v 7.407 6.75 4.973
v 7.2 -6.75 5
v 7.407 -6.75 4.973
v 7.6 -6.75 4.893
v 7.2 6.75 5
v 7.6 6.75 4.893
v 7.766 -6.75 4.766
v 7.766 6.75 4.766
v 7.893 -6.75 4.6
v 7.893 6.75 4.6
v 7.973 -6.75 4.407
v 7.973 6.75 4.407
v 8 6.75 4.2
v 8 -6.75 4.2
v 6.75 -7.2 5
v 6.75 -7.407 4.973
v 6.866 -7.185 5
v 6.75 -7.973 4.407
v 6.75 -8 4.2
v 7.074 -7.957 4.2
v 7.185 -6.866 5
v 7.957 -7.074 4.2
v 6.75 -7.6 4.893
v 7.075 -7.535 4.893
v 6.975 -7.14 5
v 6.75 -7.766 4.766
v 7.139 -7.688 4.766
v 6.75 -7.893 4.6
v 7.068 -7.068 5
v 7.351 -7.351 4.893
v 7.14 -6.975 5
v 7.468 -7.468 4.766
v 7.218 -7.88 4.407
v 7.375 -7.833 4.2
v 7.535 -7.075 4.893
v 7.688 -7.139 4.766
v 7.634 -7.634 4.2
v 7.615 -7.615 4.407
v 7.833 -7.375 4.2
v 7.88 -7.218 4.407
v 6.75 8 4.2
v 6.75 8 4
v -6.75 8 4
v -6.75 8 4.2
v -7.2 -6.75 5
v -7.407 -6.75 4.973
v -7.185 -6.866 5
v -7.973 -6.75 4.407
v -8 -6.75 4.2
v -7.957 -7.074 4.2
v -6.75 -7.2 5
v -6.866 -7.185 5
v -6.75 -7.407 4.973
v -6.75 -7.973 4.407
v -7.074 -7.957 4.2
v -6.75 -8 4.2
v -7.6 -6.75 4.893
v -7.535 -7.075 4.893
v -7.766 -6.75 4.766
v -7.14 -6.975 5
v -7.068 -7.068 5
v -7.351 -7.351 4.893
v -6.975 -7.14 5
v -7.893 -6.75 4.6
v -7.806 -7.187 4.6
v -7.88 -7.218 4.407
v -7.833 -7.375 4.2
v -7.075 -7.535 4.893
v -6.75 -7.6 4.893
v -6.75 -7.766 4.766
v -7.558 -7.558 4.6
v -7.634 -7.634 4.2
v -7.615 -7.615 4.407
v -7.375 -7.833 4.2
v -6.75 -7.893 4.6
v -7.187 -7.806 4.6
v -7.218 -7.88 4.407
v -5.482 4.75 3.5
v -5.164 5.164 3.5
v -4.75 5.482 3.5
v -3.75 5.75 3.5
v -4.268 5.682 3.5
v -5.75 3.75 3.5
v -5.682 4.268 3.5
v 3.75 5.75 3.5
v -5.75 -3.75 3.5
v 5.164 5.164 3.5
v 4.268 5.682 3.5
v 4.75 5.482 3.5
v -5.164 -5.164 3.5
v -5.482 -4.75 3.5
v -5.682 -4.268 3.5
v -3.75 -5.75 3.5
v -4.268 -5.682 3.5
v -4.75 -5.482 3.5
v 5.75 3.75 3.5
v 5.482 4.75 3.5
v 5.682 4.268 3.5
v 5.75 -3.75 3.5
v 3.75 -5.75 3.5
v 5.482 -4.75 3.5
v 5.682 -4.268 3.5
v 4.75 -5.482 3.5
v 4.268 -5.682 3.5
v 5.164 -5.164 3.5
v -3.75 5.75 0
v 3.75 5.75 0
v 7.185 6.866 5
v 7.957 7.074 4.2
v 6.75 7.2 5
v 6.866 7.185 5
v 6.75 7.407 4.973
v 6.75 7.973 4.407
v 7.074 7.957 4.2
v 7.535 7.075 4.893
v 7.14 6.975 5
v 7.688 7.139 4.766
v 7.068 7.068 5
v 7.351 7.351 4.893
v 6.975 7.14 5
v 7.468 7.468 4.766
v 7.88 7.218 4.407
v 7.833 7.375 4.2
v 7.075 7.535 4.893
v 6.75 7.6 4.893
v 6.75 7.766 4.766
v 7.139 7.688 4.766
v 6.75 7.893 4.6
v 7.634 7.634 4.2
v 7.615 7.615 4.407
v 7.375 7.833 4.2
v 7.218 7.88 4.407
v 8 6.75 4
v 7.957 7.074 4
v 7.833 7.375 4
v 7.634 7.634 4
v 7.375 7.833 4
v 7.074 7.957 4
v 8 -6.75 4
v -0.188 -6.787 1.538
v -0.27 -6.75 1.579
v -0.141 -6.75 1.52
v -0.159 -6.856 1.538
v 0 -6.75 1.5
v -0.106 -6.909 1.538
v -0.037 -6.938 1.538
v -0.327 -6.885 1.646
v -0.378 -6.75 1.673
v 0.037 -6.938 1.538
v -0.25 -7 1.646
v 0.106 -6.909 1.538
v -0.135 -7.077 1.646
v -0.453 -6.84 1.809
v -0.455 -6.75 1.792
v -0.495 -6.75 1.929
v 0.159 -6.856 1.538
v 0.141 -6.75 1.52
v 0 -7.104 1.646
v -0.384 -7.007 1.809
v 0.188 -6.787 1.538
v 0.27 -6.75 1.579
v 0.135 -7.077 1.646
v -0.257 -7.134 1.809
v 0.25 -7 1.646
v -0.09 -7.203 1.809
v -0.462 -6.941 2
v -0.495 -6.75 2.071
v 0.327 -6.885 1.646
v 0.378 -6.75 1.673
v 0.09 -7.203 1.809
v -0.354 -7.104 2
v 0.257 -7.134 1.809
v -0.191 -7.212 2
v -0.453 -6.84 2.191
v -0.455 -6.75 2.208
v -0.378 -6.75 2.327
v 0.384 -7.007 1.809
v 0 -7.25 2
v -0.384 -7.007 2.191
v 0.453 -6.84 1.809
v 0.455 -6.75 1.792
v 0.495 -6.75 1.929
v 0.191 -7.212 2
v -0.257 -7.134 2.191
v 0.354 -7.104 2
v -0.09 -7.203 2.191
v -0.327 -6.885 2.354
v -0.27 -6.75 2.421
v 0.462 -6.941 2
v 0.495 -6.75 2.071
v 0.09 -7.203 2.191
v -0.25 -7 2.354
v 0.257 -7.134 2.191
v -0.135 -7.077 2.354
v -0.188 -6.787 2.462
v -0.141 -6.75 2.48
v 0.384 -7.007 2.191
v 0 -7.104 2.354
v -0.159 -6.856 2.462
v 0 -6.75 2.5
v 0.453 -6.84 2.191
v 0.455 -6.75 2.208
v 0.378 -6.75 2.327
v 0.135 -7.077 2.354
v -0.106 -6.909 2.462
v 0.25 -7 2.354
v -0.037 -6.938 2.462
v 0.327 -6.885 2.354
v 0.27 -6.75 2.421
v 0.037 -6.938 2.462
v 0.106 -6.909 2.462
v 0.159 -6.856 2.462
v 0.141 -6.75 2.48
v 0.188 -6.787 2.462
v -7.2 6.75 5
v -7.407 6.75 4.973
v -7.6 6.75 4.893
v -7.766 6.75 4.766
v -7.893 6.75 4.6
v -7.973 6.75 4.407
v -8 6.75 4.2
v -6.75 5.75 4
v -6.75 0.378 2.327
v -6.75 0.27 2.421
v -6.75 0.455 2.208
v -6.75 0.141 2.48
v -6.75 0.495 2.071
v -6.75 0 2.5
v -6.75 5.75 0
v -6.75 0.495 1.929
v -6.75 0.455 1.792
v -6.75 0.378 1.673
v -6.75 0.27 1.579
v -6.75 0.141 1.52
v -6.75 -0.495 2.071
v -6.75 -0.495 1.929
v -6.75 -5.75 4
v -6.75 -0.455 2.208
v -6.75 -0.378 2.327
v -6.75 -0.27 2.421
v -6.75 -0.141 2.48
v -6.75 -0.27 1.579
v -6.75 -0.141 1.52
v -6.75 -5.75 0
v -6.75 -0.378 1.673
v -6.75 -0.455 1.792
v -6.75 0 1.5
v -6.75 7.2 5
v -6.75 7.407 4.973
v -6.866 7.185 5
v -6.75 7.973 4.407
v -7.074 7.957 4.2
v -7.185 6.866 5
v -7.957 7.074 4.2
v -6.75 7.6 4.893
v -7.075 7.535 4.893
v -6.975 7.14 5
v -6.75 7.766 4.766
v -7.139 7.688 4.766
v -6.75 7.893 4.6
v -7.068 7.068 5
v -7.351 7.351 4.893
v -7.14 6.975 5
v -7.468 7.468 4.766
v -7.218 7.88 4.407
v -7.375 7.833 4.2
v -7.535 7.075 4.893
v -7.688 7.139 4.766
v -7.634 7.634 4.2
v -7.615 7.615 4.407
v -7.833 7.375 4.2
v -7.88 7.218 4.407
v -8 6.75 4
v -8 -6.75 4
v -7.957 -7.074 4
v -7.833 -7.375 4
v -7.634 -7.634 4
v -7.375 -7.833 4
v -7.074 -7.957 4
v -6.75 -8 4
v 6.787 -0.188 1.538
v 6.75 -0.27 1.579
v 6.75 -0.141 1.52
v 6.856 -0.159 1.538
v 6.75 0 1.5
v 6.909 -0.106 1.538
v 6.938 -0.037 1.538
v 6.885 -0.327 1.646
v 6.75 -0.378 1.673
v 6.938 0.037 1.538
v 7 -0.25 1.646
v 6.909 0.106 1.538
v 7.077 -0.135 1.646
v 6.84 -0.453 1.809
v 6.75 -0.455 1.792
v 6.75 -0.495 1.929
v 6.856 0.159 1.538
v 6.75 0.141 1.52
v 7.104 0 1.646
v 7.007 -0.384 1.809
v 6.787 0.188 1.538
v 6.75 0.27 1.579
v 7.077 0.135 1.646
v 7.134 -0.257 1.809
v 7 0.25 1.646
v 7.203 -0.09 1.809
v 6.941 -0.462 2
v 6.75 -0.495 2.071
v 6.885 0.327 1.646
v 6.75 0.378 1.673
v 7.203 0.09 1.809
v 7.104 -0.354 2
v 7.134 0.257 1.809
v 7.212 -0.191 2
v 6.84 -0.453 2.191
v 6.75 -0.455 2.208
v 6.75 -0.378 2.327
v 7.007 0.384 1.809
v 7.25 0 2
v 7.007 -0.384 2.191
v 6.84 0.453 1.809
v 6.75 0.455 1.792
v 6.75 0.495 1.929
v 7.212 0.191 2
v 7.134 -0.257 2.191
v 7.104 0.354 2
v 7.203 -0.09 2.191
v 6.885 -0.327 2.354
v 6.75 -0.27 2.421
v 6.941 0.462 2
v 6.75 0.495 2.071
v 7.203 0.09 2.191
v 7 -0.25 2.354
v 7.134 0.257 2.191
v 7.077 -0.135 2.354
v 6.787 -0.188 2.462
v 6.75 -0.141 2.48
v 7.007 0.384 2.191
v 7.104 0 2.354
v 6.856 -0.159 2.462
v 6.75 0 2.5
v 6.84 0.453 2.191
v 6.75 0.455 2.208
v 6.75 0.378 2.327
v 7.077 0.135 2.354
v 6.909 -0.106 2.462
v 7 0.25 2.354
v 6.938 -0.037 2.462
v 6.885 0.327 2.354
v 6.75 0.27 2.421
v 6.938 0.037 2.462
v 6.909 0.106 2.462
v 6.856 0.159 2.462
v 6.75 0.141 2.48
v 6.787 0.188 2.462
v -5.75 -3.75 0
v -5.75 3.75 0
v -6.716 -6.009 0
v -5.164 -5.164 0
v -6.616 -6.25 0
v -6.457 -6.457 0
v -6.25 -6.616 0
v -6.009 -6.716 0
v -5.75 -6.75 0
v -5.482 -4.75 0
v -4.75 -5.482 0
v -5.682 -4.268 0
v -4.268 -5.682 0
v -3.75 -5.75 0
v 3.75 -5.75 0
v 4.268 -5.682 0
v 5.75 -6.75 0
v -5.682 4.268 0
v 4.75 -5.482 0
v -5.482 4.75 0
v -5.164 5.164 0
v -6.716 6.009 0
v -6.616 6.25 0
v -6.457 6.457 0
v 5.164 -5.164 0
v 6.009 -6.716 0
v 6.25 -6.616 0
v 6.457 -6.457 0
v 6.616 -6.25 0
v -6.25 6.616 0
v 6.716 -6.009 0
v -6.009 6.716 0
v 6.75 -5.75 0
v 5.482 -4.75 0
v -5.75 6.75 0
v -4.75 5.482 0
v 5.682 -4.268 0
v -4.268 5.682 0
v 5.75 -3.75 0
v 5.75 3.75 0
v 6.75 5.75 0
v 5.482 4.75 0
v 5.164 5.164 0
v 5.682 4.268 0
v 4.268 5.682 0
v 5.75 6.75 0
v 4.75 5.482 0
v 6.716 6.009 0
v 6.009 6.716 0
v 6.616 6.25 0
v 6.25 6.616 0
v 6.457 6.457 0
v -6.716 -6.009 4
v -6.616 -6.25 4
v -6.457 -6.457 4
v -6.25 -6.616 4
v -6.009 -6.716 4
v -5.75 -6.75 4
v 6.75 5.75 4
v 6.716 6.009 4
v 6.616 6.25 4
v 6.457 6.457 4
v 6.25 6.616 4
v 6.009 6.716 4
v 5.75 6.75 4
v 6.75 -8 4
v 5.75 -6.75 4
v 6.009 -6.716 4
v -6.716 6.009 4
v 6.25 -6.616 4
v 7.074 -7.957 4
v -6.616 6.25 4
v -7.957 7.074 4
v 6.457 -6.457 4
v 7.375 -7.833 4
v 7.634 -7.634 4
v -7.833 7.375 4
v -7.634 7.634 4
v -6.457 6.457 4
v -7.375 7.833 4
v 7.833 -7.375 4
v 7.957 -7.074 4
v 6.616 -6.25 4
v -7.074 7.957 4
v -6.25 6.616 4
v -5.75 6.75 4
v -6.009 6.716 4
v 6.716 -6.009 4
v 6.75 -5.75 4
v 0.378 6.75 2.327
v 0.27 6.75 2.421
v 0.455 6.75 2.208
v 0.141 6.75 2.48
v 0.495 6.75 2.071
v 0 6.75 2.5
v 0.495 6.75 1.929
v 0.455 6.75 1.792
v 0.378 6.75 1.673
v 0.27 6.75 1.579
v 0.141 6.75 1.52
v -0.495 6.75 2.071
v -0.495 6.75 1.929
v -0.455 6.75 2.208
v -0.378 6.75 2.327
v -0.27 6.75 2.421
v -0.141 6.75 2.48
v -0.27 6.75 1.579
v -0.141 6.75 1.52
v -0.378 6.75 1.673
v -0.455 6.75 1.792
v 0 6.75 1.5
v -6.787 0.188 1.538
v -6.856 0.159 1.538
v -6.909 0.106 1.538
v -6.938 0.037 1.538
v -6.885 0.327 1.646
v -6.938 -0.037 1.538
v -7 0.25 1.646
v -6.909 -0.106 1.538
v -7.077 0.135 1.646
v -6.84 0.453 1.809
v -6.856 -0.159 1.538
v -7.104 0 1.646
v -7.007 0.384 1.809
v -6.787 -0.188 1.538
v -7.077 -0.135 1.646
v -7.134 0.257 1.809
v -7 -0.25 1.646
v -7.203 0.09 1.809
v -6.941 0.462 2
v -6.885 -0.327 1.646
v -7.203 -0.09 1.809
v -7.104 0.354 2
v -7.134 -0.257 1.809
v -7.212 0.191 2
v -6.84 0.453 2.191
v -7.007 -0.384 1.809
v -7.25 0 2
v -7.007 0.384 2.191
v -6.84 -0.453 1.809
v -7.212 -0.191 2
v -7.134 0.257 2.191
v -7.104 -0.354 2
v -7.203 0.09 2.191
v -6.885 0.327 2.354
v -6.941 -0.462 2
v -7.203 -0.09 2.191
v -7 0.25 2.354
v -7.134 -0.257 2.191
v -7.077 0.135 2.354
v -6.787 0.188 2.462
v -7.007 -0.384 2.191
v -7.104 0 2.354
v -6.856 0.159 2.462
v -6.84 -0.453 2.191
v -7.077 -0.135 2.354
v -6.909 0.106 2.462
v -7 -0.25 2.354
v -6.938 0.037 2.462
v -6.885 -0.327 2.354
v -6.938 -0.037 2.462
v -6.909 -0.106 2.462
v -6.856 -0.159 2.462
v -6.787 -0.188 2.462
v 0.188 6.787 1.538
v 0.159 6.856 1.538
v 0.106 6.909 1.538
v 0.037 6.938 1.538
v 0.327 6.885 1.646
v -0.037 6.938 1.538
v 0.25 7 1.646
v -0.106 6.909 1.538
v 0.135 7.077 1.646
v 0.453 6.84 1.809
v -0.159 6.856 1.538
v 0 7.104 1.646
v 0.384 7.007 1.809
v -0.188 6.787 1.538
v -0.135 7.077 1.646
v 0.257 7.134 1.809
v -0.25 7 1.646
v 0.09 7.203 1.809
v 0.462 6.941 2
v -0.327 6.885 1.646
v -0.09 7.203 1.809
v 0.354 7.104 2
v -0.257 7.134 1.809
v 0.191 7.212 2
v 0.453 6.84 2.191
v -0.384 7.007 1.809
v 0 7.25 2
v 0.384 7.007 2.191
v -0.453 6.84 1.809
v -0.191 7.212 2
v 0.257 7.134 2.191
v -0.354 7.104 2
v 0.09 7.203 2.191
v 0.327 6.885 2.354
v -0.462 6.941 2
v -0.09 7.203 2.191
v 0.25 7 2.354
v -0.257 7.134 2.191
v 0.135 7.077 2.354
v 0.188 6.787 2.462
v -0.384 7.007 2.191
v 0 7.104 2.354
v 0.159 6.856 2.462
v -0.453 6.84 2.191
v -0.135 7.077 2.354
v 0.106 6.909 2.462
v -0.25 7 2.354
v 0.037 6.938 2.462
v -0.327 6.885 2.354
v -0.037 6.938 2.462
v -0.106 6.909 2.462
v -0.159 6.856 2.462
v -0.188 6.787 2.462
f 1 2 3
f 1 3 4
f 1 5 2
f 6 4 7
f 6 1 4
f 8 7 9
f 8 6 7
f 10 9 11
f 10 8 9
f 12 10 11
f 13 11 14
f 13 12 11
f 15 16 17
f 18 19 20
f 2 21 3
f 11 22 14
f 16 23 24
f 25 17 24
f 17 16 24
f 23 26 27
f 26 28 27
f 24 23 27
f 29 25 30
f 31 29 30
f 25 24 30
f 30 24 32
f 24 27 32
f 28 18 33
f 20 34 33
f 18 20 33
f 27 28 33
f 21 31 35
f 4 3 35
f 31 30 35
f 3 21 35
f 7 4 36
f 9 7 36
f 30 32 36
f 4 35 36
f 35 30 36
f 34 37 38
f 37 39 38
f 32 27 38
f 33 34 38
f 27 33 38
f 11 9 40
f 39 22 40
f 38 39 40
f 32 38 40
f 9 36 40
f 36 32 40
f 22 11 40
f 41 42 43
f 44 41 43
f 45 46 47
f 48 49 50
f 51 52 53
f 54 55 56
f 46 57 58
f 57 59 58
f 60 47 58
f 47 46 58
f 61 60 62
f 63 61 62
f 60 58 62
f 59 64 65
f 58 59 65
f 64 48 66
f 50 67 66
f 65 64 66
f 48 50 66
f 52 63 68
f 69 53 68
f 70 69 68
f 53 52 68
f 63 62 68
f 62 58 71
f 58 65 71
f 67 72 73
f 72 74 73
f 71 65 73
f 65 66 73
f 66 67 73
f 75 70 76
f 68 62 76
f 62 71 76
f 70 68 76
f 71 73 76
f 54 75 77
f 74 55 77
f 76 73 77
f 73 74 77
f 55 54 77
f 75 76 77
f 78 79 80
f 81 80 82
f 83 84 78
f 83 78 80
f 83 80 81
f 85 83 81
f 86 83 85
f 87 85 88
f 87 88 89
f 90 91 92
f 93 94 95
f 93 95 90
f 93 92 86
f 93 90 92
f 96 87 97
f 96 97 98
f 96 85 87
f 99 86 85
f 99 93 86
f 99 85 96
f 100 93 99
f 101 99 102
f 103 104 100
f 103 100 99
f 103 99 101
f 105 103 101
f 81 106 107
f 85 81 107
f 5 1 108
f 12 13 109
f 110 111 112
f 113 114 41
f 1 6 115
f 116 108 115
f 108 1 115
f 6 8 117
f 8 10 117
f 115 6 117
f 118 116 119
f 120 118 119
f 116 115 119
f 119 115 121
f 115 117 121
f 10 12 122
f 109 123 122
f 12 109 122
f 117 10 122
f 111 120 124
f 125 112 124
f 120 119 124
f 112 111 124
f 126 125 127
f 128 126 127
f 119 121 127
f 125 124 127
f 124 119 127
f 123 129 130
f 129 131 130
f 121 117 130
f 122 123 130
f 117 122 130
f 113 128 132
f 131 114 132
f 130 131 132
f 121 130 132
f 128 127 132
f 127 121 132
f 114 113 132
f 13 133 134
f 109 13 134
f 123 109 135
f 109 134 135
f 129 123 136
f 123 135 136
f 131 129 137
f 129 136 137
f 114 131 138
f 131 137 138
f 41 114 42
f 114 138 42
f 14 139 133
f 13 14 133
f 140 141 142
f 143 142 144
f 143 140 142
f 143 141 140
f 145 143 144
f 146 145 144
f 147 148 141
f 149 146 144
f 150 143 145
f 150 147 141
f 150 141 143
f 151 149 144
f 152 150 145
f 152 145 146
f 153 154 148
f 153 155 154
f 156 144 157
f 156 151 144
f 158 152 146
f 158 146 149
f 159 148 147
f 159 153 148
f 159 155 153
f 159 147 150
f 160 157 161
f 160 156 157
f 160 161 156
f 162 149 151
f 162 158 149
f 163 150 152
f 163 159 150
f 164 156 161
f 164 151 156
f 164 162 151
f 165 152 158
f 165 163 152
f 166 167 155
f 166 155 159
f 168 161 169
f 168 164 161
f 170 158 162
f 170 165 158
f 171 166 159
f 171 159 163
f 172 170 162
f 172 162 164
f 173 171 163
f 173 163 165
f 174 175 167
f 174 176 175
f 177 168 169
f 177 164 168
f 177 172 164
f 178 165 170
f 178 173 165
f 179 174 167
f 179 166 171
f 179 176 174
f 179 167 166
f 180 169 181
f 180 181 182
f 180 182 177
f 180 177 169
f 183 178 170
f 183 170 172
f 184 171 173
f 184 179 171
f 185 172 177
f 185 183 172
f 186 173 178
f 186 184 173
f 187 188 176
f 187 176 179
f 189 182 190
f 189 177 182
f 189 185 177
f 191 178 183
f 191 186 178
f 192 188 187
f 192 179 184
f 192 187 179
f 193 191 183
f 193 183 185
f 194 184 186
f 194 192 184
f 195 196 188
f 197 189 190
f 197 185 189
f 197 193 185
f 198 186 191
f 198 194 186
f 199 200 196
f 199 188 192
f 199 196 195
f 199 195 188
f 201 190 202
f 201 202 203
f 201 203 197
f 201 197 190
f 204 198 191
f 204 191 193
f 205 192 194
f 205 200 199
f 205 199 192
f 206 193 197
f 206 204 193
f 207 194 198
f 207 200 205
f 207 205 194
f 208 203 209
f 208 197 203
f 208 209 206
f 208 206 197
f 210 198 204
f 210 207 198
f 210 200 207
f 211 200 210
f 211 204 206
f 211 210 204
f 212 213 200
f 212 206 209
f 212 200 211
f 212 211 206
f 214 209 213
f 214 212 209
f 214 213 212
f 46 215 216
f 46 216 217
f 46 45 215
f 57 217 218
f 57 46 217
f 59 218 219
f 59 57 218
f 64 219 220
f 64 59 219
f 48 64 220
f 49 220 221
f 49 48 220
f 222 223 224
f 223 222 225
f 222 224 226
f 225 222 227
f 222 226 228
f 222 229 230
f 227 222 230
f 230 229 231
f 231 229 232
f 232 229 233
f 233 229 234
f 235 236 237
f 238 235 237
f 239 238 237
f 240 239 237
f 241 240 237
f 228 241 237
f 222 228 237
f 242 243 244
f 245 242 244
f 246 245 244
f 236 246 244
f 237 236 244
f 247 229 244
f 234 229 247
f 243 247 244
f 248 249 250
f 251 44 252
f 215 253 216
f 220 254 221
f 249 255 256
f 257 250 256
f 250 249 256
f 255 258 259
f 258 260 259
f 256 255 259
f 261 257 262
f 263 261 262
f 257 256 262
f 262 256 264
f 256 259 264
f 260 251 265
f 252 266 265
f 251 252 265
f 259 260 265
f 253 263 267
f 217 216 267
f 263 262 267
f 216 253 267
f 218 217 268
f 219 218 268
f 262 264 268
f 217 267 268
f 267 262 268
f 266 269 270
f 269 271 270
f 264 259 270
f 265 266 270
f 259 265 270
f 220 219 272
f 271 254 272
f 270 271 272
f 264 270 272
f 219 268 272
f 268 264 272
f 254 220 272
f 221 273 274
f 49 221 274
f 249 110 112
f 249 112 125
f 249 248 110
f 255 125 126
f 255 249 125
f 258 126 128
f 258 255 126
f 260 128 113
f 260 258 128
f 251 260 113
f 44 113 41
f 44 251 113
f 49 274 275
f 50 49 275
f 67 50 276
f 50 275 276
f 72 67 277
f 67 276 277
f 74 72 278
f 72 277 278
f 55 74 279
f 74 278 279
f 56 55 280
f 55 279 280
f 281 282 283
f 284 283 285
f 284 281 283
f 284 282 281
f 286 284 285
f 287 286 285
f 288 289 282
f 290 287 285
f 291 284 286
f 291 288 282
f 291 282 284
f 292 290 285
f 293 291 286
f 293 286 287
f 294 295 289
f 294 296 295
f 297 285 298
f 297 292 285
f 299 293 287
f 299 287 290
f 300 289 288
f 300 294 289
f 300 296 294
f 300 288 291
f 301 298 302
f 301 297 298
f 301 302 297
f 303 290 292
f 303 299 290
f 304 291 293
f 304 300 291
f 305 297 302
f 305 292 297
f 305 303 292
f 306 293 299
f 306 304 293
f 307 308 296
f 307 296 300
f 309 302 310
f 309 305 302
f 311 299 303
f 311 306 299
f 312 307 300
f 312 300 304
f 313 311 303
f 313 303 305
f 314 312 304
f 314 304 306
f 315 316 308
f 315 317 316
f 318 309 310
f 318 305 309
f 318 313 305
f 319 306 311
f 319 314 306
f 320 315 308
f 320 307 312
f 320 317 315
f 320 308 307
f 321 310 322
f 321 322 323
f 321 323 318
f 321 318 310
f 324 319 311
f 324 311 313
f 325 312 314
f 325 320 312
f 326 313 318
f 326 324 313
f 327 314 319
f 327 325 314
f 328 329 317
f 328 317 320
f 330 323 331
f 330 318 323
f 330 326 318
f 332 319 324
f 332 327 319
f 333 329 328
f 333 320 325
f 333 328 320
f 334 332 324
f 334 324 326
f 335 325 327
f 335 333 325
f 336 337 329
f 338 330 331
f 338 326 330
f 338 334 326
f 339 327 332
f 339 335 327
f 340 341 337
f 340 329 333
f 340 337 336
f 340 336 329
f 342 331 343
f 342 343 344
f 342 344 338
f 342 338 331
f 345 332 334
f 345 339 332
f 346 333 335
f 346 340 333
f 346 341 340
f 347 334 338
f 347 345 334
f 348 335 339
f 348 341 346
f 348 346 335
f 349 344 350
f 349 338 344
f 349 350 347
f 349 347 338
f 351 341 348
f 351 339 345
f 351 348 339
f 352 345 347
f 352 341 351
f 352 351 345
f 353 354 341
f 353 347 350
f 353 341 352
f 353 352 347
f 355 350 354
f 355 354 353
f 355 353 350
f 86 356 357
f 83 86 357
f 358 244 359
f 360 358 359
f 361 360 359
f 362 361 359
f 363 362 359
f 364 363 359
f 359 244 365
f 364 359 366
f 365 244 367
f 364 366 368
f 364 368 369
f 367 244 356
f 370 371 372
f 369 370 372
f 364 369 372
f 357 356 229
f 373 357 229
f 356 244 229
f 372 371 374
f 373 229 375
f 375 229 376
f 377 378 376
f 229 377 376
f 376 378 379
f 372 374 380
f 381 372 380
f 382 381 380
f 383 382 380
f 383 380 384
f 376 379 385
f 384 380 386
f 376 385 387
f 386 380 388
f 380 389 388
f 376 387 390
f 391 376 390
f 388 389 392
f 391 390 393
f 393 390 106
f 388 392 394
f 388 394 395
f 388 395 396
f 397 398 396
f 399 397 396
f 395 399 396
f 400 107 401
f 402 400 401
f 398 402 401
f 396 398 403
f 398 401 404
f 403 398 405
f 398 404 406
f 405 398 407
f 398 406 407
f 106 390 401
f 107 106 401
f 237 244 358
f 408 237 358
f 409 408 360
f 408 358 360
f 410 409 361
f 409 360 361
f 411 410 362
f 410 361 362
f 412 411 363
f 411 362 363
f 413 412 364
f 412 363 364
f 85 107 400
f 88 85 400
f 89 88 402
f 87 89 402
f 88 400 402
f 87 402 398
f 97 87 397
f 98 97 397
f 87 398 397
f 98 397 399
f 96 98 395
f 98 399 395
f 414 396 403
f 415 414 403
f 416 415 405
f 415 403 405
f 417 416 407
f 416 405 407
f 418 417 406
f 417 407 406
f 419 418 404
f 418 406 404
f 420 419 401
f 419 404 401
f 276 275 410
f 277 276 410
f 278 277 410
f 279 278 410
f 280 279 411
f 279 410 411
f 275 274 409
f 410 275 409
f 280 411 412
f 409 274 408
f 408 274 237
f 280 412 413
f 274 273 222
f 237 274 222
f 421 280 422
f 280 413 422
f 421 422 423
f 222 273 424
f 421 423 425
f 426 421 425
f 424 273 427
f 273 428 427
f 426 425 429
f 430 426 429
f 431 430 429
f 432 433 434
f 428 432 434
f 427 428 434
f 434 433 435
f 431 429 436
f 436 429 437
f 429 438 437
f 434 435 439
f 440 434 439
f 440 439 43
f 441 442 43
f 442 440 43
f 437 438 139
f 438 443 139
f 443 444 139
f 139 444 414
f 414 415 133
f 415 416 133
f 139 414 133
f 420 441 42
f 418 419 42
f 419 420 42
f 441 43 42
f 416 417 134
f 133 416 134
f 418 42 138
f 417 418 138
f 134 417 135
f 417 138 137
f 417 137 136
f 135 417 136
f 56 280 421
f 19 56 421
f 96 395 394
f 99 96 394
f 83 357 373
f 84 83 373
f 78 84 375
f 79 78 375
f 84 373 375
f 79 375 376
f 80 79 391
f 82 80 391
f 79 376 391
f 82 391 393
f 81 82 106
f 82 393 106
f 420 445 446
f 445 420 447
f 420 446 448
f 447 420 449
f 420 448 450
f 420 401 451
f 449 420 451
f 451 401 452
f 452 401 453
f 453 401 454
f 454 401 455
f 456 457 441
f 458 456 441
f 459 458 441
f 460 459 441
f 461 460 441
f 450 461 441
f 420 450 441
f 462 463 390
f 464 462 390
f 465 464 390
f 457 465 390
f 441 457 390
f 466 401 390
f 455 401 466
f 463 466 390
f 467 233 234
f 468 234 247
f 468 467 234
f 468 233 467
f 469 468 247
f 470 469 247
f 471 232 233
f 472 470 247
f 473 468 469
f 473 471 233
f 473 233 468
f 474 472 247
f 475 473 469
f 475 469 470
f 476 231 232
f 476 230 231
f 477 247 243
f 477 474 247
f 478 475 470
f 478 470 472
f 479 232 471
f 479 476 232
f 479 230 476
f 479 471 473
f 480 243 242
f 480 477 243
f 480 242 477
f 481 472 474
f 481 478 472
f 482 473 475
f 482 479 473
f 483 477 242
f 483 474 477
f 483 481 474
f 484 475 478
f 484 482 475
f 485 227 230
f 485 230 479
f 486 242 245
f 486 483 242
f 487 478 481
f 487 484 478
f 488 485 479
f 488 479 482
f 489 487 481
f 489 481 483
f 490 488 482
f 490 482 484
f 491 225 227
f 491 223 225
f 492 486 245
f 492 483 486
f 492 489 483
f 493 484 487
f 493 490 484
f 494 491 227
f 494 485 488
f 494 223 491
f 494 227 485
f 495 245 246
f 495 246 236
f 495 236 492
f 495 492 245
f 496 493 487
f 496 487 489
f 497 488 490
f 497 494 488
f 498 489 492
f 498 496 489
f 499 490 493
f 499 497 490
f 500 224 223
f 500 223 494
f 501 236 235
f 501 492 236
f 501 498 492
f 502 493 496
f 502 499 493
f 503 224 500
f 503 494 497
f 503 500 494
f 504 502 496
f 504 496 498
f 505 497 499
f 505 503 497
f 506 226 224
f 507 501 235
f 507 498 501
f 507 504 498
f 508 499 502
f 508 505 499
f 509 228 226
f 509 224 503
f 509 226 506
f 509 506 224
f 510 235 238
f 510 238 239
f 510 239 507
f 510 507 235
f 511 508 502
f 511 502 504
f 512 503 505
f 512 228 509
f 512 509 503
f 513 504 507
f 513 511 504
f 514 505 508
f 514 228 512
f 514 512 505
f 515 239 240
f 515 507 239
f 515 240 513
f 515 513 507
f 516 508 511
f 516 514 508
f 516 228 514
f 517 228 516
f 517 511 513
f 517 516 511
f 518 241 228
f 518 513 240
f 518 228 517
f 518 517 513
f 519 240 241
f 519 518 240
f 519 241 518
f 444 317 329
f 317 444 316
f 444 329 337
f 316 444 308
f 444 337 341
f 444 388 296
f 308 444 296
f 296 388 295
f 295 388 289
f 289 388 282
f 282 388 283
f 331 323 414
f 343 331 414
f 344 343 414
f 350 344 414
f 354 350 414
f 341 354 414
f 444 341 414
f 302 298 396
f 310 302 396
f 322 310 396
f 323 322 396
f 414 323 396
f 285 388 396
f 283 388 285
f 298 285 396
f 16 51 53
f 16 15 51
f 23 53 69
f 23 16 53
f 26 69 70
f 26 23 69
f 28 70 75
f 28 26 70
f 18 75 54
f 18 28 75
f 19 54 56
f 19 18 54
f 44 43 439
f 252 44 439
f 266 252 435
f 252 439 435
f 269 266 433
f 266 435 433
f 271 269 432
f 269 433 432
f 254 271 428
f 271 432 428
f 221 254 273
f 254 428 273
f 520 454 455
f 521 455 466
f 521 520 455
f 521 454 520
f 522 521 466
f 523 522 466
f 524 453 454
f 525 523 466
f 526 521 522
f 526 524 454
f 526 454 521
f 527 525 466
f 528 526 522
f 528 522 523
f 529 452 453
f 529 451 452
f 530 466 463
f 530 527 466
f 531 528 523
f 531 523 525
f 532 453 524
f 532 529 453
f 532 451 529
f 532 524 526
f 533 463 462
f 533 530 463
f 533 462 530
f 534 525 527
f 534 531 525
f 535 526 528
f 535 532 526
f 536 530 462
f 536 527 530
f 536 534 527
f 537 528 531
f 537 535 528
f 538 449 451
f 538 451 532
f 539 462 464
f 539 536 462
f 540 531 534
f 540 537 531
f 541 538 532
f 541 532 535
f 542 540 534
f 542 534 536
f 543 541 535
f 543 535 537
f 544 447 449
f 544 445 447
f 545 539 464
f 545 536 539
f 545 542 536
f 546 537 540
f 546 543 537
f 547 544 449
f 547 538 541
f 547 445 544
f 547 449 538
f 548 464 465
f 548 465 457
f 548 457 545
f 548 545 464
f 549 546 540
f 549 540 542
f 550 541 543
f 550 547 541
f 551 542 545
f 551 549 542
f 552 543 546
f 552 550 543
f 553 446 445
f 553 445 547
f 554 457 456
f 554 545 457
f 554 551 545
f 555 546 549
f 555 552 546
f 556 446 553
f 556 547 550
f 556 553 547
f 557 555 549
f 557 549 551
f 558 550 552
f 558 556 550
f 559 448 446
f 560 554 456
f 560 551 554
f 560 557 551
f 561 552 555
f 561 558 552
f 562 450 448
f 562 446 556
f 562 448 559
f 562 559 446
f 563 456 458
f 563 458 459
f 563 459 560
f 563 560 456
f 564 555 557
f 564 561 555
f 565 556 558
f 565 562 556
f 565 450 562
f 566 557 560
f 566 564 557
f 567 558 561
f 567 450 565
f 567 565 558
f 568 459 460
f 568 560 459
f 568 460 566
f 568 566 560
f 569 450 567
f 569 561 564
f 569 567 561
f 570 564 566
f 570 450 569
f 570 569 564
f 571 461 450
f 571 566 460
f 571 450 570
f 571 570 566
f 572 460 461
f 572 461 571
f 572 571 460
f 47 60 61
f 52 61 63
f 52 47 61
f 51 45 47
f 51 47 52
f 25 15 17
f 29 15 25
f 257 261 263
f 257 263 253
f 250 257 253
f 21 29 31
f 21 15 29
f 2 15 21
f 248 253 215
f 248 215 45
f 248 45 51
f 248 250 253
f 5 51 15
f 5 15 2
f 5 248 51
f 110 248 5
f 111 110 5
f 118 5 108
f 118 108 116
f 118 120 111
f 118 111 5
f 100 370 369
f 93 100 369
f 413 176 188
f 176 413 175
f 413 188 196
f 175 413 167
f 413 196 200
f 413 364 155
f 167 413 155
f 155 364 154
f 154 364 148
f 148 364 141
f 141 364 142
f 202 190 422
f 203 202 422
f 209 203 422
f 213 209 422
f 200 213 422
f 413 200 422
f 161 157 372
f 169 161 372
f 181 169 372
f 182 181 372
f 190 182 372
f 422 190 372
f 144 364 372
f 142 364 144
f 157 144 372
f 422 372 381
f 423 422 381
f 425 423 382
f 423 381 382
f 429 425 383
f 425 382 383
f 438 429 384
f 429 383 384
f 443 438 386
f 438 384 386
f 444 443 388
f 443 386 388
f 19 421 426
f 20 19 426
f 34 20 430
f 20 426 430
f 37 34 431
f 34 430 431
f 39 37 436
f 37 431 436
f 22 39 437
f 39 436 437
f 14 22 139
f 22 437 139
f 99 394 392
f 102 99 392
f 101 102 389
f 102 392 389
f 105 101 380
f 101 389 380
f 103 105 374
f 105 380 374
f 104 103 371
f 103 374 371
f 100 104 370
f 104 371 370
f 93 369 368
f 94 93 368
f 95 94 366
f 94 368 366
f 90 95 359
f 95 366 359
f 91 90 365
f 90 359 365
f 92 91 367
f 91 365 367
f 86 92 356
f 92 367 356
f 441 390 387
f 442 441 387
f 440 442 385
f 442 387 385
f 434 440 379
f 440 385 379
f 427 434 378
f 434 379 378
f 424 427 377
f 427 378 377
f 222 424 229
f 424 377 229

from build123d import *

# Parameters (mm, degrees)
PAD_DEPTH          = 4
PAD001_DEPTH       = 1
FILLET_R           = 0.8
POLARPATTERN_COUNT = 4
POCKET_DEPTH       = 3.5


with BuildPart() as part:
    # Sketch → Pad (new body)
    with BuildSketch(Plane.XY):
        with BuildLine():
            Line((5.75, 6.75), (-5.75, 6.75))
            ThreePointArc((-5.75, 6.75), (-6.457107, 6.457107), (-6.75, 5.75))
            Line((-6.75, 5.75), (-6.75, -5.75))
            ThreePointArc((-6.75, -5.75), (-6.457107, -6.457107), (-5.75, -6.75))
            Line((-5.75, -6.75), (5.75, -6.75))
            ThreePointArc((5.75, -6.75), (6.457107, -6.457107), (6.75, -5.75))
            Line((6.75, -5.75), (6.75, 5.75))
            ThreePointArc((6.75, 5.75), (6.457107, 6.457107), (5.75, 6.75))
        make_face()
    extrude(amount=PAD_DEPTH)

    # Sketch001 (on Face10 of Pad) → Pad001 (join)
    with BuildSketch(Plane.XY.offset(4)):
        with BuildLine():
            Line((6.75, 8), (-6.75, 8))
            ThreePointArc((-6.75, 8), (-7.633883, 7.633883), (-8, 6.75))
            Line((-8, 6.75), (-8, -6.75))
            ThreePointArc((-8, -6.75), (-7.633883, -7.633883), (-6.75, -8))
            Line((-6.75, -8), (6.75, -8))
            ThreePointArc((6.75, -8), (7.633883, -7.633883), (8, -6.75))
            Line((8, -6.75), (8, 6.75))
            ThreePointArc((8, 6.75), (7.633883, 7.633883), (6.75, 8))
        make_face()
    extrude(amount=PAD001_DEPTH)

    # Fillet
    fillet_edges = [part.edges().sort_by_distance(p)[0] for p in [
        (0, -8, 5),
        (-7.633883, -7.633883, 5),
        (-8, 0, 5),
        (-7.633883, 7.633883, 5),
        (0, 8, 5),
        (7.633883, 7.633883, 5),
        (8, 0, 5),
        (7.633883, -7.633883, 5),
    ]]
    fillet(fillet_edges, radius=FILLET_R)

    # Sphere → Sphere (revolve)
    with BuildSketch(Plane(origin=(0, -6.75, 2), x_dir=(1, 0, 0), z_dir=(0, -1, 0))):
        with BuildLine():
            ThreePointArc((0, -0.5), (0.5, 0), (0, 0.5))
            Line((0, 0.5), (0, -0.5))
        make_face()
    sphere = revolve(axis=Axis((0, -6.75, 2), (0, 0, 1)))

    # PolarPattern: Sphere ×4 about axis
    polarpattern_axis = Axis((0, 0, 0), (0, 0, 1))
    for i in range(1, POLARPATTERN_COUNT):
        add(sphere.rotate(polarpattern_axis, i * 360 / POLARPATTERN_COUNT))

    # Sketch004 (on Face27 of PolarPattern) → Pocket (cut)
    with BuildSketch(Plane(origin=(0, -6.75, 0), x_dir=(1, 0, 0), z_dir=(0, 0, -1))):
        with BuildLine():
            Line((-5.75, -3), (-5.75, -10.5))
            ThreePointArc((-5.75, -10.5), (-5.164214, -11.914214), (-3.75, -12.5))
            Line((-3.75, -12.5), (3.75, -12.5))
            ThreePointArc((3.75, -12.5), (5.164214, -11.914214), (5.75, -10.5))
            Line((5.75, -10.5), (5.75, -3))
            ThreePointArc((5.75, -3), (5.164214, -1.585786), (3.75, -1))
            Line((3.75, -1), (-3.75, -1))
            ThreePointArc((-3.75, -1), (-5.164214, -1.585786), (-5.75, -3))
        make_face()
    extrude(amount=-POCKET_DEPTH, mode=Mode.SUBTRACT)


solid = part.part
